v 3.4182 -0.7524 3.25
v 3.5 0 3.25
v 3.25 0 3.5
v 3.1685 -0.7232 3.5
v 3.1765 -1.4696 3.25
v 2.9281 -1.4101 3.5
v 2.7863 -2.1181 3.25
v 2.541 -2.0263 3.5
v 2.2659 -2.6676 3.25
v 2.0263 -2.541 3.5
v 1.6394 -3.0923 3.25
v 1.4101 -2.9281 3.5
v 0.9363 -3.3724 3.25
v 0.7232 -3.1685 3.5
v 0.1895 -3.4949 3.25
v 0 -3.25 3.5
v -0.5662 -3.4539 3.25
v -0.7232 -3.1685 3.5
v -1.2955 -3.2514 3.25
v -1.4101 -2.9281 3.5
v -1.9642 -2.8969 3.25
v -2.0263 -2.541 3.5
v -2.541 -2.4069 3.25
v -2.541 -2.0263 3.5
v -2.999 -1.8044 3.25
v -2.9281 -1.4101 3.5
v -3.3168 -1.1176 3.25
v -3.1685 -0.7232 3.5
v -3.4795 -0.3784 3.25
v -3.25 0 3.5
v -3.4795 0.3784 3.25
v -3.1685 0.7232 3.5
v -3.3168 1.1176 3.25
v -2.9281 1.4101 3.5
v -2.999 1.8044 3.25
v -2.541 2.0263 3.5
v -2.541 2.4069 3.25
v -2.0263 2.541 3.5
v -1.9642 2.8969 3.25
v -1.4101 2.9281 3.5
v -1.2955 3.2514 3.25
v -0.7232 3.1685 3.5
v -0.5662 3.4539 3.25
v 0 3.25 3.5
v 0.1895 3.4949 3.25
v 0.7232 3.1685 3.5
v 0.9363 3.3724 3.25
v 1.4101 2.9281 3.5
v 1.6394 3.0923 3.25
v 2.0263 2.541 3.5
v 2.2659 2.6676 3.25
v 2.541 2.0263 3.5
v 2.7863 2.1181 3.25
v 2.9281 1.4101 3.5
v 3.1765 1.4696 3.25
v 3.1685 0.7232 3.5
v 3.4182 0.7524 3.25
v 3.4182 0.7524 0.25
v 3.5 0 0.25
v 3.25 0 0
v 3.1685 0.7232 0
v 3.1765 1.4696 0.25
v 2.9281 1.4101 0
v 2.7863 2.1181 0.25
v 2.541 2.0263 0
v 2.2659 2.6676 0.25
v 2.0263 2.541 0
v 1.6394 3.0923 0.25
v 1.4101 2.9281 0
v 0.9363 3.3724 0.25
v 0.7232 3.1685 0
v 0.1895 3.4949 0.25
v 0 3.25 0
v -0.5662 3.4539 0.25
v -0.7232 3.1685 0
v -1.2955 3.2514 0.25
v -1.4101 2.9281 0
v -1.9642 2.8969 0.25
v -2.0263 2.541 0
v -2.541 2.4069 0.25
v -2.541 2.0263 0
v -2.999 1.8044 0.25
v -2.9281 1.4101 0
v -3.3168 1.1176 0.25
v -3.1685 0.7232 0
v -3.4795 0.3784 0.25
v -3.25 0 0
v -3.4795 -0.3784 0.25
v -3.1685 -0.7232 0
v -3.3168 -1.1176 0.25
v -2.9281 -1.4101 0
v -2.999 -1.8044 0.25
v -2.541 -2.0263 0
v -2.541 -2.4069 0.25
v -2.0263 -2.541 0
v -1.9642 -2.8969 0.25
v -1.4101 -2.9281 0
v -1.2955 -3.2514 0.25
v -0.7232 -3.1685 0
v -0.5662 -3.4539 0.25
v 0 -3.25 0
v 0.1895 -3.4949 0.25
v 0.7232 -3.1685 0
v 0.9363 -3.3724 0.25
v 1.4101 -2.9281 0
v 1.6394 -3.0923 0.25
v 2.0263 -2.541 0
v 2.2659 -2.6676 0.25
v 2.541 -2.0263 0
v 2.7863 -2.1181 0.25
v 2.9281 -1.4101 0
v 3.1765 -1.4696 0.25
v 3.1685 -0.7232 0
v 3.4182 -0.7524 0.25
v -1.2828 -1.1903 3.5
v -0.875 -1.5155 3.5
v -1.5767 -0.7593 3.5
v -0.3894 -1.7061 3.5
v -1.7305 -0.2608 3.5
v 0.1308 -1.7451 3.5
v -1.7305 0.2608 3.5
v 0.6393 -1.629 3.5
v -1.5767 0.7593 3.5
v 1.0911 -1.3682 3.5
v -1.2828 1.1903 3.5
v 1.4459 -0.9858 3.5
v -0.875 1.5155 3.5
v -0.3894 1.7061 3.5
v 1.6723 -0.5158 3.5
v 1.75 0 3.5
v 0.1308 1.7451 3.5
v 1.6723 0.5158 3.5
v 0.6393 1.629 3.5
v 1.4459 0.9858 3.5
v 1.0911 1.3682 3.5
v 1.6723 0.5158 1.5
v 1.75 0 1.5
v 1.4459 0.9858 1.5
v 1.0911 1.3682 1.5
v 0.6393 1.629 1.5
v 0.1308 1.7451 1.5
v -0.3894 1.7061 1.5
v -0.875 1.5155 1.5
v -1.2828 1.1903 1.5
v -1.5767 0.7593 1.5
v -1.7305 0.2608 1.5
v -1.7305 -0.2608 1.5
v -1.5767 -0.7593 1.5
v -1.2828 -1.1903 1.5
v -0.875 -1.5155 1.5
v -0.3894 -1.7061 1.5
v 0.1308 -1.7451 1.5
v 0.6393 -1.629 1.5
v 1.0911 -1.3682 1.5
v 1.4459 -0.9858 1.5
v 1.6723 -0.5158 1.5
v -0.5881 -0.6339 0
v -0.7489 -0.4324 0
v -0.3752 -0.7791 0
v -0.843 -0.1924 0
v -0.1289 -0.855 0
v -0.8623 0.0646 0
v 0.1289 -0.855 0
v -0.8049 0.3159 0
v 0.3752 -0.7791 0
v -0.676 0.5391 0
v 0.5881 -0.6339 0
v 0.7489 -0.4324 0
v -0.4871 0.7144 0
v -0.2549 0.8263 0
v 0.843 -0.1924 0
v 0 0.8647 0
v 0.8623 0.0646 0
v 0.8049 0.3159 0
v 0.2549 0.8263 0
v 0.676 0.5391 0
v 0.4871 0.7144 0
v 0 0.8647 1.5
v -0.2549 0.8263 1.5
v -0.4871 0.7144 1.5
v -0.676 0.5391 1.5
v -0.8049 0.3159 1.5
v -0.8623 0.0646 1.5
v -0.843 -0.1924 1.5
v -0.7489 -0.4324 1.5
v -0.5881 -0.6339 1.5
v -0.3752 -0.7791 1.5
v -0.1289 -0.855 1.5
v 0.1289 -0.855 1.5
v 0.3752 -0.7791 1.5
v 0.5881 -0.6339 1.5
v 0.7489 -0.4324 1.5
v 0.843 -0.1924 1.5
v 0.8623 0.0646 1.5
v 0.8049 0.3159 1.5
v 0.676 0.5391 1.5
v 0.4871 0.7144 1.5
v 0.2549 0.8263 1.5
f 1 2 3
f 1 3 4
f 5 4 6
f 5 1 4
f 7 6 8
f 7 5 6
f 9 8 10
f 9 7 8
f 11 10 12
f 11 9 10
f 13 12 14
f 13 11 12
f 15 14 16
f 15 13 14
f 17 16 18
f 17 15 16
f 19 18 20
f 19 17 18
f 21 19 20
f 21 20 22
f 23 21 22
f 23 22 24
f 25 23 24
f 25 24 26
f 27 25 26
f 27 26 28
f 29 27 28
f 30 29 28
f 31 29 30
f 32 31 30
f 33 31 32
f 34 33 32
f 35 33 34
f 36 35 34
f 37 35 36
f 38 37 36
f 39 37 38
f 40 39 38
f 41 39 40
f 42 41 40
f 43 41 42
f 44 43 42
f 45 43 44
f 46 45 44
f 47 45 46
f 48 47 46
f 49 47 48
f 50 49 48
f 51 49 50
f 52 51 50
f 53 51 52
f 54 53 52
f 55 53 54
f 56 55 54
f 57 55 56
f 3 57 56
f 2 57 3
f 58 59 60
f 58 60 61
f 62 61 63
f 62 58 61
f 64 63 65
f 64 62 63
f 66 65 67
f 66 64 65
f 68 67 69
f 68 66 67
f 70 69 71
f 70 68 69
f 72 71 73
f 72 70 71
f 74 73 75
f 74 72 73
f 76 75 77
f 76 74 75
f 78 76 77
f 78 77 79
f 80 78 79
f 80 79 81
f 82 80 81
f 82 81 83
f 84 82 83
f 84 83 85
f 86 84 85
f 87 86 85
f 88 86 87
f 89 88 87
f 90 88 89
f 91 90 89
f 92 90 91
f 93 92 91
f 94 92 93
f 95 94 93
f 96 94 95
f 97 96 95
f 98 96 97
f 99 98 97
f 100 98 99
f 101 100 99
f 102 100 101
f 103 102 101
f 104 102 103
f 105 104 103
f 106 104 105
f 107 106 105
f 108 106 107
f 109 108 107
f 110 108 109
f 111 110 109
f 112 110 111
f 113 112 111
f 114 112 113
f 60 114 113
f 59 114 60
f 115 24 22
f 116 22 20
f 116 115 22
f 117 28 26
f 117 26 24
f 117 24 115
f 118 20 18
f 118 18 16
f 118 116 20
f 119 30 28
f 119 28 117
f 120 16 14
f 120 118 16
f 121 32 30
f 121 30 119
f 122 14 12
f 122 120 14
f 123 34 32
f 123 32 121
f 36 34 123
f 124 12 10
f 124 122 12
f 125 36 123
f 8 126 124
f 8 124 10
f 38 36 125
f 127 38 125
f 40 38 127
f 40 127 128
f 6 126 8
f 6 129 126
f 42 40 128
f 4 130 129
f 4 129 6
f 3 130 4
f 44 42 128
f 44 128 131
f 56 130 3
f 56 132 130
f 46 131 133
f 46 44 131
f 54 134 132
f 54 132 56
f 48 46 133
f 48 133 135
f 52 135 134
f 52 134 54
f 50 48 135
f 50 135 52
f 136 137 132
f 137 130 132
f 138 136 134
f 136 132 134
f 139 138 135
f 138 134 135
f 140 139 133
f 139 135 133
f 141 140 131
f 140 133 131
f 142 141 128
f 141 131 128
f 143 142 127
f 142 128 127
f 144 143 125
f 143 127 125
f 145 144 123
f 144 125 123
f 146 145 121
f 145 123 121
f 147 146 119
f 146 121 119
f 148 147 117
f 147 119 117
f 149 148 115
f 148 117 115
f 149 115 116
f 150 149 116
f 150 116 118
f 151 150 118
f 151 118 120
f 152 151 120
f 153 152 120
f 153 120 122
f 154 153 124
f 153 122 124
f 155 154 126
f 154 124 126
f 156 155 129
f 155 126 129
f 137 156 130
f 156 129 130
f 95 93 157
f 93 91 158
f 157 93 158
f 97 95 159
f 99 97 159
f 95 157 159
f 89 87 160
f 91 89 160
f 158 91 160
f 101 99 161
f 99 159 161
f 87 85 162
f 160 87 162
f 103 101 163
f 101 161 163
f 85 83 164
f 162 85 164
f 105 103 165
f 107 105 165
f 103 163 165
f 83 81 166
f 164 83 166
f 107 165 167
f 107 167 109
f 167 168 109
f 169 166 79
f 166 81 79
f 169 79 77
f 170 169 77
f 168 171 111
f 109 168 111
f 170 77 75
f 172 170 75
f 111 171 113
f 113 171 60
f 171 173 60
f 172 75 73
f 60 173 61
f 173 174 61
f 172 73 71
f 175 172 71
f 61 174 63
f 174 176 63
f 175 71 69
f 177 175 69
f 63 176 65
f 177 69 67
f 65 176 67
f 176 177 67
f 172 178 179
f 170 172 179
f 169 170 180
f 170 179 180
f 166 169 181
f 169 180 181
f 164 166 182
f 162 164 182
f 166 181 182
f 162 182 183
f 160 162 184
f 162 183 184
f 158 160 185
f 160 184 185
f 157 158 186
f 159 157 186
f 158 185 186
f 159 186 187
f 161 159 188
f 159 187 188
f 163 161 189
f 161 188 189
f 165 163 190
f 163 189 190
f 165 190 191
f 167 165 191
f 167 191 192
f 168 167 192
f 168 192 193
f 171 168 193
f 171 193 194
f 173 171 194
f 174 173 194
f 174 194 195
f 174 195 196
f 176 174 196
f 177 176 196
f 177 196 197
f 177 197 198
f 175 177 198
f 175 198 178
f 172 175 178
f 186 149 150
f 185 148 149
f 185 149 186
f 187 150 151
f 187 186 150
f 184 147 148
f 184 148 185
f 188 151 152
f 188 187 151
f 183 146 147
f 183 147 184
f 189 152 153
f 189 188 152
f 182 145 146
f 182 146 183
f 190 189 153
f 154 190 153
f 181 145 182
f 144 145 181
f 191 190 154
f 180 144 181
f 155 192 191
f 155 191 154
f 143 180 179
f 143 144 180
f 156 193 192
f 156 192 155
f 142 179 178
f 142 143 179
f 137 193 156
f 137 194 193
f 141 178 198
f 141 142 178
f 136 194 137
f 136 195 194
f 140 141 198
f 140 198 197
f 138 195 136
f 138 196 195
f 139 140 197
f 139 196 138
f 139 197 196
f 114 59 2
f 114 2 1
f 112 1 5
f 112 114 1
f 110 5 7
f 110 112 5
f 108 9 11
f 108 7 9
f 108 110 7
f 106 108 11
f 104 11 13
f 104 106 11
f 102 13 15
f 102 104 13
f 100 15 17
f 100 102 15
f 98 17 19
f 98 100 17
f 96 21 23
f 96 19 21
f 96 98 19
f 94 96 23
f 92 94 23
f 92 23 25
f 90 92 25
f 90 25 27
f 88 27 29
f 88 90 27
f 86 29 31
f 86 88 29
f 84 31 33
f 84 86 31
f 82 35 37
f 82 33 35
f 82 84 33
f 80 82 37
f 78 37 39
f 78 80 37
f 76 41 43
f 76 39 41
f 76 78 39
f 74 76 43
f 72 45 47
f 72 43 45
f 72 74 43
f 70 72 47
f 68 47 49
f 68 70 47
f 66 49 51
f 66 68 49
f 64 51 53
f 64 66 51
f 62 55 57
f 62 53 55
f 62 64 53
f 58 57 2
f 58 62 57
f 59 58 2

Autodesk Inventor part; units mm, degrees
ref_plane "YZ Plane" through (0, 0, 0) normal (1, 0, 0) x (0, 1, 0)
ref_plane "XZ Plane" through (0, 0, 0) normal (0, 1, 0) x (-1, 0, 0)
ref_plane "XY Plane" through (0, 0, 0) normal (0, 0, 1) x (1, 0, 0)
sketch "Sketch1" plane through (0, 0, 0) normal (0, 0, 1) x (1, 0, 0)
  circle A0 centre (0, 0) radius 3.5
  dimension "d0" = 7
extrude "Extrusion1" add sketch "Sketch1" along normal blind 3.5
hole "Hole1" at (0, 0, 0) direction (0, 0, 1) diameter 1.7294 depth 10 tip angle 118 thread size "M2x0.25" class "6H" standard "ISO Metric profile"
chamfer "Chamfer1" distance 0.25 angle 45 2 edges at (-3.5, 0, 3.5) (-3.5, 0, 0)
sketch "Sketch2" plane through (0, 0, 3.5) normal (0, 0, 1) x (1, 0, 0)
  circle A0 centre (0, 0) radius 1.75
  dimension "d13" = 3.5
extrude "Extrusion2" cut sketch "Sketch2" against normal blind 2
properties part number "Cover of port"
